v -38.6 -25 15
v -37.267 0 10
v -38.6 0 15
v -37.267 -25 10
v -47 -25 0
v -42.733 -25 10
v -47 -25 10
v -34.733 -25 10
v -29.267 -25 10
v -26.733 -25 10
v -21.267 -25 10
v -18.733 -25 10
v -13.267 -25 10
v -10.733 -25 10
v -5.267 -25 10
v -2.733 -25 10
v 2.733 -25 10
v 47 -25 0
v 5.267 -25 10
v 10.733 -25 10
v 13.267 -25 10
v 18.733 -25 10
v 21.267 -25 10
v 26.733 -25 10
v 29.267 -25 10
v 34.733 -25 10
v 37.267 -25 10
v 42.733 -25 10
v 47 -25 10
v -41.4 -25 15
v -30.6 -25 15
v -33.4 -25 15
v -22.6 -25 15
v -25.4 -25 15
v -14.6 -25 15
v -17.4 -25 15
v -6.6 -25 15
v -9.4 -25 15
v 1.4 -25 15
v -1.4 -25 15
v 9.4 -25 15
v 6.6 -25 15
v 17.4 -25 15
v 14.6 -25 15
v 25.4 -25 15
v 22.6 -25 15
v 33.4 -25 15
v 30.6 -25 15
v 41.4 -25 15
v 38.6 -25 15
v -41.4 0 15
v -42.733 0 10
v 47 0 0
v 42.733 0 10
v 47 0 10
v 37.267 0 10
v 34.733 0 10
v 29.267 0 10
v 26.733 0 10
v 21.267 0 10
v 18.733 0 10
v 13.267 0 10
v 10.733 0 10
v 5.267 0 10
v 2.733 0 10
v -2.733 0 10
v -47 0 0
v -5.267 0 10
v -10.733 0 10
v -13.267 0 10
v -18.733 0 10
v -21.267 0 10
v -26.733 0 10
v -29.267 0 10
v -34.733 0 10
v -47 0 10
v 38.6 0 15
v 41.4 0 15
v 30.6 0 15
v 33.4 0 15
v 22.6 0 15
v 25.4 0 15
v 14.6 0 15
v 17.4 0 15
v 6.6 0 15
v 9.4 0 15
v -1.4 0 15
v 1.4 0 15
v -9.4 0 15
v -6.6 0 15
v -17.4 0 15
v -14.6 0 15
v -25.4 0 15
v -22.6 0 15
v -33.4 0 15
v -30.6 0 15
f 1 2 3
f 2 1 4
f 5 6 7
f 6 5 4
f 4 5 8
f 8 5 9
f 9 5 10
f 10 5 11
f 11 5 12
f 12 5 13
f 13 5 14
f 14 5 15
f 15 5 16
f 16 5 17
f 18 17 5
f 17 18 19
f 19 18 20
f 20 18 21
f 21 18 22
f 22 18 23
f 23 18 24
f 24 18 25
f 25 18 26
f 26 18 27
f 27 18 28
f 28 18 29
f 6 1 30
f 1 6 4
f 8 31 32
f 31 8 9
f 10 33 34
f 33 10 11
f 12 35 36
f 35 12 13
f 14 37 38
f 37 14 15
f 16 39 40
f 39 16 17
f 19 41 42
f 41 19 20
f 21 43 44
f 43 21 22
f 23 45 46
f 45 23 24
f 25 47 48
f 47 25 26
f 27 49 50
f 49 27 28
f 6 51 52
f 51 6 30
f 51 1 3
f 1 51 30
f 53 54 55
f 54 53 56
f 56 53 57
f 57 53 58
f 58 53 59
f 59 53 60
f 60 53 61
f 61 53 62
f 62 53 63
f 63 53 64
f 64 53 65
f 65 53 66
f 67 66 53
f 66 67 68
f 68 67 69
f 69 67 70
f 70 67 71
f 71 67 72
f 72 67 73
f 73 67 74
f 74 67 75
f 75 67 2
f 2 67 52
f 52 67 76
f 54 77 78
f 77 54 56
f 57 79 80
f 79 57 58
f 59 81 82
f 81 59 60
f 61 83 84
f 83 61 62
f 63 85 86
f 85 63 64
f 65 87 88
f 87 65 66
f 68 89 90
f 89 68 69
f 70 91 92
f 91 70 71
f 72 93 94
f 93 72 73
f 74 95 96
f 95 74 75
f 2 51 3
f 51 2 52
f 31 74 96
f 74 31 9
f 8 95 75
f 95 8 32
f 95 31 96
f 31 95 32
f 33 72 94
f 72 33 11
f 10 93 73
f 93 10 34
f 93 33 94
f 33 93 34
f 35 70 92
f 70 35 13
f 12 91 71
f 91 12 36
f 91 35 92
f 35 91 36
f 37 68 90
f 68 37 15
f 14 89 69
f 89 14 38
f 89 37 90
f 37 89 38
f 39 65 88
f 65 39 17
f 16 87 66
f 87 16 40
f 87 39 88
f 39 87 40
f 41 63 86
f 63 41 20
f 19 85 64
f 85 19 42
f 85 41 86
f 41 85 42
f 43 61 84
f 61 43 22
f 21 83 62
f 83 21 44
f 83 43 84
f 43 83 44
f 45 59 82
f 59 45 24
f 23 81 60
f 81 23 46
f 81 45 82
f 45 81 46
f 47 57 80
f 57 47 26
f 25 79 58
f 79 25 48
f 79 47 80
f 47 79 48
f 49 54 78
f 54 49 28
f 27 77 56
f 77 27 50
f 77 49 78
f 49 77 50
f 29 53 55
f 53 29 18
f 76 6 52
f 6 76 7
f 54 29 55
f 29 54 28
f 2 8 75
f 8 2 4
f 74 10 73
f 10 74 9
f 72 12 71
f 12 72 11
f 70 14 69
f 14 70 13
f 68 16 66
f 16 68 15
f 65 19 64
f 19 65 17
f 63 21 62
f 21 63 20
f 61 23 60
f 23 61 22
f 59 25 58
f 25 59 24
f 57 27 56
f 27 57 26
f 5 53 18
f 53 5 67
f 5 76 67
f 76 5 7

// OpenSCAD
$fn = 32;

// ----------------------------------------------------------------------
// Toothed rack, 11 teeth
// 8 mm pitch, 5 mm teeth
// ----------------------------------------------------------------------

// --- parameters (mm) ---
bar_w = 25;     // bar width (Y)
bar_h = 10;     // bar height (Z)
teeth = 11;     // number of teeth
pitch = 8;      // tooth pitch
tooth_h = 5;    // tooth height above the bar
root_w = 6;     // tooth width at the root
crest_w = 2.8;  // tooth width at the crest

// --- derived feature positions (mm) ---
span = (teeth - 1) * pitch;  // = 80   distance between the outer teeth
bar_l = span + root_w + 8;   // = 94   bar length: teeth plus 4 mm at each end
tooth_x = -span / 2;         // = -40   X of the first tooth
height = bar_h + tooth_h;    // = 15   overall height
feature_centers = [
  [tooth_x + 0 * pitch, -bar_w / 2],
  [tooth_x + 1 * pitch, -bar_w / 2],
  [tooth_x + 2 * pitch, -bar_w / 2],
  [tooth_x + 3 * pitch, -bar_w / 2],
  [tooth_x + 4 * pitch, -bar_w / 2],
  [tooth_x + 5 * pitch, -bar_w / 2],
  [tooth_x + 6 * pitch, -bar_w / 2],
  [tooth_x + 7 * pitch, -bar_w / 2],
  [tooth_x + 8 * pitch, -bar_w / 2],
  [tooth_x + 9 * pitch, -bar_w / 2],
  [tooth_x + 10 * pitch, -bar_w / 2]
];   // tooth centre line, drives the tooth loop

// bar with a rack of teeth, one extruded trapezoium per centre
module rack_tooth() {
  linear_extrude(height = bar_w)
    polygon(points = [
      [0, 0],
      [root_w, 0],
      [root_w / 2 + crest_w / 2, tooth_h + 1],
      [root_w / 2 - crest_w / 2, tooth_h + 1]
    ]);
}

union() {
  translate([-bar_l / 2, -bar_w, 0]) cube([bar_l, bar_w, bar_h]);
  for (centre = feature_centers)
    translate([centre[0] - root_w / 2, 0, bar_h - 1]) rotate([90, 0, 0]) rack_tooth();
}
